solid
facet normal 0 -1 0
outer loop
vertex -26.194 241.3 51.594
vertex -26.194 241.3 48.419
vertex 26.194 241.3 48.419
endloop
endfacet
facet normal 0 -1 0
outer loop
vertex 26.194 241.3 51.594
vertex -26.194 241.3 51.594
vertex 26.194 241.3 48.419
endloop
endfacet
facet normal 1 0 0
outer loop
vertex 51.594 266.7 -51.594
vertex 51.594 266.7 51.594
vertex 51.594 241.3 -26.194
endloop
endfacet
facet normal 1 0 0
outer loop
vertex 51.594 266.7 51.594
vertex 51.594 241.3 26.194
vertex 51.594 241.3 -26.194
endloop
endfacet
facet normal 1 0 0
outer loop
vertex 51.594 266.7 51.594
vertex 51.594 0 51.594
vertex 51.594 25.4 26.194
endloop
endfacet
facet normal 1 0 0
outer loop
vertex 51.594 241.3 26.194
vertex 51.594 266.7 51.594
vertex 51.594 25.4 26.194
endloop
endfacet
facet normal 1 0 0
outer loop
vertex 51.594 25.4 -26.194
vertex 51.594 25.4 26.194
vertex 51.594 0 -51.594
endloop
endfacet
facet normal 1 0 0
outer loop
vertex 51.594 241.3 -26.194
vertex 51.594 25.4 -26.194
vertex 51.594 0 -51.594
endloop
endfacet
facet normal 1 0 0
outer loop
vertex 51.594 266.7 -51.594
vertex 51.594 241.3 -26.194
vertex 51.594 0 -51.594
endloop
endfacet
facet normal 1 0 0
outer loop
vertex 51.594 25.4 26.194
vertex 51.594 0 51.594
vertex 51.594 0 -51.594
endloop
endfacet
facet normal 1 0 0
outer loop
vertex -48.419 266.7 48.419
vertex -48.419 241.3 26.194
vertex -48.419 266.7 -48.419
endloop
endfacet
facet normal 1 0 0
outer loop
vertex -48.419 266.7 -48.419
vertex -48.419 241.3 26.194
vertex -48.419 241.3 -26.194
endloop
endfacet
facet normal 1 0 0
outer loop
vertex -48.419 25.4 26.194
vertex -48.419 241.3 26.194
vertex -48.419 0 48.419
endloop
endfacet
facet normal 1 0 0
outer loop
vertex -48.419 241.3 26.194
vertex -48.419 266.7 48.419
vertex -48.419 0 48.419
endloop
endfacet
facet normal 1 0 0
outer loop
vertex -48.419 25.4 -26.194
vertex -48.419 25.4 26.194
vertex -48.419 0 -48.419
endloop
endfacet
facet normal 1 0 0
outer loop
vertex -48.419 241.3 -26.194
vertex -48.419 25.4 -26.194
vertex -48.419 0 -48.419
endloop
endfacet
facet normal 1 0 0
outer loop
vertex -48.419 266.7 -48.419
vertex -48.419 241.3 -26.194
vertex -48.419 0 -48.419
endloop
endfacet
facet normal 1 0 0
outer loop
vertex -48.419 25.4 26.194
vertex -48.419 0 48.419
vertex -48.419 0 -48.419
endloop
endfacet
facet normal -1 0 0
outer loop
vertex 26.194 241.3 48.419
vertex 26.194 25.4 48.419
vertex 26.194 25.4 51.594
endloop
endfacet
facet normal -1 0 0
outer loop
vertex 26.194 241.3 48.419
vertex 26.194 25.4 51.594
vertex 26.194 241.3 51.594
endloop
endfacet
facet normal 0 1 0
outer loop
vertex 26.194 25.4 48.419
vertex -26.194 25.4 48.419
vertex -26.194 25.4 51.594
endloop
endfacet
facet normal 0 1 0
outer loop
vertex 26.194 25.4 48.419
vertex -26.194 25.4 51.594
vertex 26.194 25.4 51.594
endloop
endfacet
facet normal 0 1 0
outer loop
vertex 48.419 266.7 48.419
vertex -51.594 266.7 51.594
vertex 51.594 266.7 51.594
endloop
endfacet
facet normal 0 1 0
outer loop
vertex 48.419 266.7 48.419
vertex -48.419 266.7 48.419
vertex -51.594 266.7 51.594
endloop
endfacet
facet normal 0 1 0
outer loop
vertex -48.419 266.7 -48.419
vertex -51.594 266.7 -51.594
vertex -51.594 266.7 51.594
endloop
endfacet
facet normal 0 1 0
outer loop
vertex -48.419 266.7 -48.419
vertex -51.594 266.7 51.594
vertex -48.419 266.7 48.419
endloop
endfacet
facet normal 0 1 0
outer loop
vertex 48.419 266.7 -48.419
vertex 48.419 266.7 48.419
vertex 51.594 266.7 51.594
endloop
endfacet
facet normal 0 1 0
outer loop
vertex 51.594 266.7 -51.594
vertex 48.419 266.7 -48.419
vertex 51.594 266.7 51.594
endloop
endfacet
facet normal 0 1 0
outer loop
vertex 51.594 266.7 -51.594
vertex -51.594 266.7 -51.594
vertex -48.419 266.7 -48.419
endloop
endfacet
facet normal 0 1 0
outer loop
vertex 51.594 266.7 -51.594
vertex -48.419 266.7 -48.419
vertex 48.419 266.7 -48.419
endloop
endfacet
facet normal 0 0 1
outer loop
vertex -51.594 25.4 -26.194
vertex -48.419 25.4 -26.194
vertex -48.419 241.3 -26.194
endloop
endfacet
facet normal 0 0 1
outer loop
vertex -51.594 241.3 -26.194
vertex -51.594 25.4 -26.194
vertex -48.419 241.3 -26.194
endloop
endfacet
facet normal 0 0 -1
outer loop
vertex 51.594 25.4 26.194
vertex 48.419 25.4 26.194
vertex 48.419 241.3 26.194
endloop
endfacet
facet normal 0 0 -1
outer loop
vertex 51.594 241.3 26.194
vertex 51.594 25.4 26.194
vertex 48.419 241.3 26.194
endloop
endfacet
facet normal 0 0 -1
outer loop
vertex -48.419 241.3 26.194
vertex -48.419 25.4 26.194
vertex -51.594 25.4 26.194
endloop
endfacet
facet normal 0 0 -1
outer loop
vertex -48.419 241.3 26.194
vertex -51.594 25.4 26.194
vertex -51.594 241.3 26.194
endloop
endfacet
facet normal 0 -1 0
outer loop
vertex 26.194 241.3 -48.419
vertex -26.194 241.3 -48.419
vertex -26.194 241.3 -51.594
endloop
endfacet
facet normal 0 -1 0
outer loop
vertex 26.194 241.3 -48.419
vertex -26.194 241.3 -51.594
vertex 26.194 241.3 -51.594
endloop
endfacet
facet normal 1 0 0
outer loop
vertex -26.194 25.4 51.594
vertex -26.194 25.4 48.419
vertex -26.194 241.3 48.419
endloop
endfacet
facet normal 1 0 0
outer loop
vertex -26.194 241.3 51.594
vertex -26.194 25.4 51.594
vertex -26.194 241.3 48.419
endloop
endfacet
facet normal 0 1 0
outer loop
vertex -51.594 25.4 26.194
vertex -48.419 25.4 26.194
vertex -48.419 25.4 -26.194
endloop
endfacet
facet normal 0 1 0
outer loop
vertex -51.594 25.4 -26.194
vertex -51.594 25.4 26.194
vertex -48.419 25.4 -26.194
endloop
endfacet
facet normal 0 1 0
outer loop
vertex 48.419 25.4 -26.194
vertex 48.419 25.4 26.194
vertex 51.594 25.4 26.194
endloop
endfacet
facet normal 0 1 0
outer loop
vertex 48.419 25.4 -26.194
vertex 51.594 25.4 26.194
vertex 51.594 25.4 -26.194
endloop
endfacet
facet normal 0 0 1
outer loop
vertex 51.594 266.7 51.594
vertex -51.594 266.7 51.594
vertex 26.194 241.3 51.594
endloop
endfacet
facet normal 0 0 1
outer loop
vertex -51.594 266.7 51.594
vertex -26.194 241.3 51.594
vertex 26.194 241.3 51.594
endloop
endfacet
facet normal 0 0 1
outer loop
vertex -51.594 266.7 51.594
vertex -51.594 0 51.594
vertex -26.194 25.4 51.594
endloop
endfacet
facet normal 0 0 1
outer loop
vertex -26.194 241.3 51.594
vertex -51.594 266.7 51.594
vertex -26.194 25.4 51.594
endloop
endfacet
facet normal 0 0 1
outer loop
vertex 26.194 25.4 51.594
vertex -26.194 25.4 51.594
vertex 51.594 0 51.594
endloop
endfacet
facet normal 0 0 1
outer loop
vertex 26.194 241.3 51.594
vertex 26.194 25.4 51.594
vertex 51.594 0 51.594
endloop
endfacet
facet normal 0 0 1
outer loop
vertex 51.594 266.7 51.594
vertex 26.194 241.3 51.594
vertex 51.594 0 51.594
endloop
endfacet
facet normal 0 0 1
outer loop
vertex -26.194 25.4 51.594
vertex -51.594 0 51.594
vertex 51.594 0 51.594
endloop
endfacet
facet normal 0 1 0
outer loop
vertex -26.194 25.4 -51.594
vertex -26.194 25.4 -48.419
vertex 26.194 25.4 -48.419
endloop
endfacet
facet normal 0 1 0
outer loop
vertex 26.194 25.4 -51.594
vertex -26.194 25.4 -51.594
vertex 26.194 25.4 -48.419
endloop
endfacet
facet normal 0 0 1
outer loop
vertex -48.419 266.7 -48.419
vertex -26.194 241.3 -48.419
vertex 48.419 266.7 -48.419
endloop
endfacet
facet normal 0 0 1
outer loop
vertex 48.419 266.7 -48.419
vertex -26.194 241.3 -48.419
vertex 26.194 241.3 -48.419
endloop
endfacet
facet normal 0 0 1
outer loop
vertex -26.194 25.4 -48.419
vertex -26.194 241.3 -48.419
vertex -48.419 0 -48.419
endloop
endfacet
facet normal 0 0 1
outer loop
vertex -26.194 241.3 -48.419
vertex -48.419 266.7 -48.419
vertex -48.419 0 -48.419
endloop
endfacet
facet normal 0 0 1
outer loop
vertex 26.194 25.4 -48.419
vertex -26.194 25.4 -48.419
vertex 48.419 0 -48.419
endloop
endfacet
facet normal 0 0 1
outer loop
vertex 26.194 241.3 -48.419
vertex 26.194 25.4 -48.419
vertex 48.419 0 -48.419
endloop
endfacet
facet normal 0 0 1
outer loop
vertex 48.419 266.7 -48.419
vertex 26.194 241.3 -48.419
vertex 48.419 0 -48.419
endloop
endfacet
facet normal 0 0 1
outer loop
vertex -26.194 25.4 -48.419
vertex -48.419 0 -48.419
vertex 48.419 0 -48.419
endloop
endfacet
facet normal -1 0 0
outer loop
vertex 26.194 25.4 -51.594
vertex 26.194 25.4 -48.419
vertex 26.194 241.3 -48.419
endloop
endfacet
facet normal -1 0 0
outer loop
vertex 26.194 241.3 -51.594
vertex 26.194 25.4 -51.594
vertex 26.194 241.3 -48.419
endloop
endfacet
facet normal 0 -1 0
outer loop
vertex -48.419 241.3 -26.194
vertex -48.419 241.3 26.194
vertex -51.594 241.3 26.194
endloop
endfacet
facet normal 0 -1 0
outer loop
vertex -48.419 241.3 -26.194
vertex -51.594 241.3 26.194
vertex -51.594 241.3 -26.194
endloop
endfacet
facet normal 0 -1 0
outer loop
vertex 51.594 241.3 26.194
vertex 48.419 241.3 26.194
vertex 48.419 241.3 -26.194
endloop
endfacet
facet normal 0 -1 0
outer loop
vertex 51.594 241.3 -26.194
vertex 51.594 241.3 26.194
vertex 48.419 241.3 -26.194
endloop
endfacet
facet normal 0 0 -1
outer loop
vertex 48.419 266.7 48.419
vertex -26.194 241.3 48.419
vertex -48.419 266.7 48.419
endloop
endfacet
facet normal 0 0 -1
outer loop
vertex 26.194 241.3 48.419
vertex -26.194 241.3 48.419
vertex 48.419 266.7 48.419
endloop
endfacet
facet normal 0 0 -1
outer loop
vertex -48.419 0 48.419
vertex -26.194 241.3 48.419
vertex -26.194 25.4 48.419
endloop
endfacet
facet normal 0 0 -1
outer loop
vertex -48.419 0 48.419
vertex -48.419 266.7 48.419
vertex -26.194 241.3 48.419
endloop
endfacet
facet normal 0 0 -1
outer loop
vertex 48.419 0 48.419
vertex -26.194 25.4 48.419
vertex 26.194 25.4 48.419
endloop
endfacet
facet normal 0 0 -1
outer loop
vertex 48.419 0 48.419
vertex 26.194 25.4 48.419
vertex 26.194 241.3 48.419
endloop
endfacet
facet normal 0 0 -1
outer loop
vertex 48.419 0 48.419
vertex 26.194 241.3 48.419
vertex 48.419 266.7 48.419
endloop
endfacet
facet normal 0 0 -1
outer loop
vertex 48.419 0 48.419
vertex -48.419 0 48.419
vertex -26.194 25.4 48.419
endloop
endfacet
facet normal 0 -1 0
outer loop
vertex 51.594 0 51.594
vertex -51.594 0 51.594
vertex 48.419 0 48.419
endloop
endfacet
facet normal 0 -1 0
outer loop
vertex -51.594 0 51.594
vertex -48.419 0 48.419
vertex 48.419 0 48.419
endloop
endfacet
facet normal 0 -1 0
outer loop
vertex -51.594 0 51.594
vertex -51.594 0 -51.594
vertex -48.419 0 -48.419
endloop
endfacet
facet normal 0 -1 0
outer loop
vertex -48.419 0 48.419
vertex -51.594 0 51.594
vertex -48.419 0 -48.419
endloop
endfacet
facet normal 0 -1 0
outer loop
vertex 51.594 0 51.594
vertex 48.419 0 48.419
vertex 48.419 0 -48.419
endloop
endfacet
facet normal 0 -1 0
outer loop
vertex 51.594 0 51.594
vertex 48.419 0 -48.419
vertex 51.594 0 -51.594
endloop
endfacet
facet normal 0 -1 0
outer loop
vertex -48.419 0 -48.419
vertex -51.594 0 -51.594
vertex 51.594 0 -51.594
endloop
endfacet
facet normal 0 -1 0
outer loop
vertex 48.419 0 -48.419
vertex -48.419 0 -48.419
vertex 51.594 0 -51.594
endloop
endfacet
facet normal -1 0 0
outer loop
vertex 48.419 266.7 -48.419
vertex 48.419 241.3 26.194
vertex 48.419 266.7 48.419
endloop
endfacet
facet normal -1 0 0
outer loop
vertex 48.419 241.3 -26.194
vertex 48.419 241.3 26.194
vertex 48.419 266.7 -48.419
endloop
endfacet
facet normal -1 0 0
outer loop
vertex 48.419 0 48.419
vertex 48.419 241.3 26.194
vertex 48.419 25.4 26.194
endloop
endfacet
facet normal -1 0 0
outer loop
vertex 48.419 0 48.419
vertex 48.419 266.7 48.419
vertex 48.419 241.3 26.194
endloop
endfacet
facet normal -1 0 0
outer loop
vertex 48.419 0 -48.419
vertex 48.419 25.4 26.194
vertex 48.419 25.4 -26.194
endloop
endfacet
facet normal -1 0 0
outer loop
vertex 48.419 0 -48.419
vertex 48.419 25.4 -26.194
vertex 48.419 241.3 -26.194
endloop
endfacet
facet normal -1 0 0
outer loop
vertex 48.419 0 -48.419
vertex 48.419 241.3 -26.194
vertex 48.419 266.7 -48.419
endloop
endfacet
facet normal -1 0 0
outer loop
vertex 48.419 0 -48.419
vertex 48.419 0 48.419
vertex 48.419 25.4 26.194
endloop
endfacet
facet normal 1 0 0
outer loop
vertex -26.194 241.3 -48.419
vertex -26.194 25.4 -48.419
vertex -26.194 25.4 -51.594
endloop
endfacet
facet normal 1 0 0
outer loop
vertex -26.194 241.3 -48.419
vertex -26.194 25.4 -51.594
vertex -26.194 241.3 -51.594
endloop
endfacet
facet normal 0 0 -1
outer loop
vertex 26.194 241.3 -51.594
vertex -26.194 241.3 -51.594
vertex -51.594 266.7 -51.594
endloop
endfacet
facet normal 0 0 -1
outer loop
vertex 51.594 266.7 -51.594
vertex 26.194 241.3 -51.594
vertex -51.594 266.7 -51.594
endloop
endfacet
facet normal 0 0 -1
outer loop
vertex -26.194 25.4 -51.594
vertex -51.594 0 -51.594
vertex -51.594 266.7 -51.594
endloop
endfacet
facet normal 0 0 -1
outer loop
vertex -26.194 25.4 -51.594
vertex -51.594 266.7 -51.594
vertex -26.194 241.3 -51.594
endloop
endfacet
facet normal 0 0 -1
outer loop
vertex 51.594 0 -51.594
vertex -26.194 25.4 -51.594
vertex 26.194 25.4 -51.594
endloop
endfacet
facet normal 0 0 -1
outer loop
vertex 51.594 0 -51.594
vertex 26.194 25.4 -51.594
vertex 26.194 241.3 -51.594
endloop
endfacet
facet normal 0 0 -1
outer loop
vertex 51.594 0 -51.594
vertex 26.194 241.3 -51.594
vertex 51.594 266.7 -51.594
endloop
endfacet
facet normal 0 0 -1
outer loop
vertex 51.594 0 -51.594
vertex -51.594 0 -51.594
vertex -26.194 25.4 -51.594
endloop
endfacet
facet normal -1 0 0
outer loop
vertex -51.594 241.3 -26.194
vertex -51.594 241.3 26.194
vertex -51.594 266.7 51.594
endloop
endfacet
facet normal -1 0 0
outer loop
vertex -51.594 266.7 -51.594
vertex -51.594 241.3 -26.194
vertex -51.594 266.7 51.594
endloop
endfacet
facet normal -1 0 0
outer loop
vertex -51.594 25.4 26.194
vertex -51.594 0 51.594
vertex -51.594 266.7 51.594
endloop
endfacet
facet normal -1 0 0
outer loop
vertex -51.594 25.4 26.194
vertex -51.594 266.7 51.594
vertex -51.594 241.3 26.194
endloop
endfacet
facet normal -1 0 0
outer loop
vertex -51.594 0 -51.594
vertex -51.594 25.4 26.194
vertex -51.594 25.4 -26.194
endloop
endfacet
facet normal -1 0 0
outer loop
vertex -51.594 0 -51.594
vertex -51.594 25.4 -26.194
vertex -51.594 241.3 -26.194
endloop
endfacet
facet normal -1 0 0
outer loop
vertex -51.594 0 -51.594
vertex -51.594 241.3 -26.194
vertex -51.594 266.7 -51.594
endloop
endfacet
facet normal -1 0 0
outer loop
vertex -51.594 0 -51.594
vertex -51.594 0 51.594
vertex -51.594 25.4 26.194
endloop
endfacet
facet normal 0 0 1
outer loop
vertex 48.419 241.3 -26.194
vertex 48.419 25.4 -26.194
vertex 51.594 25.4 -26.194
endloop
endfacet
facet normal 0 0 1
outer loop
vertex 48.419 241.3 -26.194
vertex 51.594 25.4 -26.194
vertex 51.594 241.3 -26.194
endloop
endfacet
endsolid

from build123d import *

# Parameters (mm, degrees)
SKETCH1_W               = 103.1875
SKETCH1_H               = 103.1875
SKETCH1_W_2             = 96.8375
SKETCH1_H_2             = 96.8375
BOSS_EXTRUDE1_DEPTH     = 266.7
SKETCH2_W               = 52.3875
SKETCH2_H               = 215.9
CUT_EXTRUDE2_DEPTH      = 52.59375
CUT_EXTRUDE2_DEPTH_BACK = 52.59375
SKETCH3_W               = 52.3875
SKETCH3_H               = 215.9
CUT_EXTRUDE3_DEPTH      = 52.59375
CUT_EXTRUDE3_DEPTH_BACK = 52.59375


with BuildPart() as part:
    # Sketch1 → Boss-Extrude1 (new body)
    with BuildSketch(Plane(origin=(0, 0, 0), x_dir=(1, 0, 0), z_dir=(0, 1, 0))):
        Rectangle(SKETCH1_W, SKETCH1_H)
        Rectangle(SKETCH1_W_2, SKETCH1_H_2, mode=Mode.SUBTRACT)
    extrude(amount=BOSS_EXTRUDE1_DEPTH)

    # Sketch2 → Cut-Extrude2 (cut, two sides)
    with BuildSketch(Plane.XY) as cut_extrude2_sk:
        with Locations((0, 133.35)):
            Rectangle(SKETCH2_W, SKETCH2_H)
    extrude(amount=CUT_EXTRUDE2_DEPTH, mode=Mode.SUBTRACT)
    extrude(cut_extrude2_sk.sketch, amount=-CUT_EXTRUDE2_DEPTH_BACK, mode=Mode.SUBTRACT)

    # Sketch3 → Cut-Extrude3 (cut, two sides)
    with BuildSketch(Plane(origin=(0, 0, 0), x_dir=(0, 0, -1), z_dir=(1, 0, 0))) as cut_extrude3_sk:
        with Locations((0, 133.35)):
            Rectangle(SKETCH3_W, SKETCH3_H)
    extrude(amount=CUT_EXTRUDE3_DEPTH, mode=Mode.SUBTRACT)
    extrude(cut_extrude3_sk.sketch, amount=-CUT_EXTRUDE3_DEPTH_BACK, mode=Mode.SUBTRACT)


solid = part.part
